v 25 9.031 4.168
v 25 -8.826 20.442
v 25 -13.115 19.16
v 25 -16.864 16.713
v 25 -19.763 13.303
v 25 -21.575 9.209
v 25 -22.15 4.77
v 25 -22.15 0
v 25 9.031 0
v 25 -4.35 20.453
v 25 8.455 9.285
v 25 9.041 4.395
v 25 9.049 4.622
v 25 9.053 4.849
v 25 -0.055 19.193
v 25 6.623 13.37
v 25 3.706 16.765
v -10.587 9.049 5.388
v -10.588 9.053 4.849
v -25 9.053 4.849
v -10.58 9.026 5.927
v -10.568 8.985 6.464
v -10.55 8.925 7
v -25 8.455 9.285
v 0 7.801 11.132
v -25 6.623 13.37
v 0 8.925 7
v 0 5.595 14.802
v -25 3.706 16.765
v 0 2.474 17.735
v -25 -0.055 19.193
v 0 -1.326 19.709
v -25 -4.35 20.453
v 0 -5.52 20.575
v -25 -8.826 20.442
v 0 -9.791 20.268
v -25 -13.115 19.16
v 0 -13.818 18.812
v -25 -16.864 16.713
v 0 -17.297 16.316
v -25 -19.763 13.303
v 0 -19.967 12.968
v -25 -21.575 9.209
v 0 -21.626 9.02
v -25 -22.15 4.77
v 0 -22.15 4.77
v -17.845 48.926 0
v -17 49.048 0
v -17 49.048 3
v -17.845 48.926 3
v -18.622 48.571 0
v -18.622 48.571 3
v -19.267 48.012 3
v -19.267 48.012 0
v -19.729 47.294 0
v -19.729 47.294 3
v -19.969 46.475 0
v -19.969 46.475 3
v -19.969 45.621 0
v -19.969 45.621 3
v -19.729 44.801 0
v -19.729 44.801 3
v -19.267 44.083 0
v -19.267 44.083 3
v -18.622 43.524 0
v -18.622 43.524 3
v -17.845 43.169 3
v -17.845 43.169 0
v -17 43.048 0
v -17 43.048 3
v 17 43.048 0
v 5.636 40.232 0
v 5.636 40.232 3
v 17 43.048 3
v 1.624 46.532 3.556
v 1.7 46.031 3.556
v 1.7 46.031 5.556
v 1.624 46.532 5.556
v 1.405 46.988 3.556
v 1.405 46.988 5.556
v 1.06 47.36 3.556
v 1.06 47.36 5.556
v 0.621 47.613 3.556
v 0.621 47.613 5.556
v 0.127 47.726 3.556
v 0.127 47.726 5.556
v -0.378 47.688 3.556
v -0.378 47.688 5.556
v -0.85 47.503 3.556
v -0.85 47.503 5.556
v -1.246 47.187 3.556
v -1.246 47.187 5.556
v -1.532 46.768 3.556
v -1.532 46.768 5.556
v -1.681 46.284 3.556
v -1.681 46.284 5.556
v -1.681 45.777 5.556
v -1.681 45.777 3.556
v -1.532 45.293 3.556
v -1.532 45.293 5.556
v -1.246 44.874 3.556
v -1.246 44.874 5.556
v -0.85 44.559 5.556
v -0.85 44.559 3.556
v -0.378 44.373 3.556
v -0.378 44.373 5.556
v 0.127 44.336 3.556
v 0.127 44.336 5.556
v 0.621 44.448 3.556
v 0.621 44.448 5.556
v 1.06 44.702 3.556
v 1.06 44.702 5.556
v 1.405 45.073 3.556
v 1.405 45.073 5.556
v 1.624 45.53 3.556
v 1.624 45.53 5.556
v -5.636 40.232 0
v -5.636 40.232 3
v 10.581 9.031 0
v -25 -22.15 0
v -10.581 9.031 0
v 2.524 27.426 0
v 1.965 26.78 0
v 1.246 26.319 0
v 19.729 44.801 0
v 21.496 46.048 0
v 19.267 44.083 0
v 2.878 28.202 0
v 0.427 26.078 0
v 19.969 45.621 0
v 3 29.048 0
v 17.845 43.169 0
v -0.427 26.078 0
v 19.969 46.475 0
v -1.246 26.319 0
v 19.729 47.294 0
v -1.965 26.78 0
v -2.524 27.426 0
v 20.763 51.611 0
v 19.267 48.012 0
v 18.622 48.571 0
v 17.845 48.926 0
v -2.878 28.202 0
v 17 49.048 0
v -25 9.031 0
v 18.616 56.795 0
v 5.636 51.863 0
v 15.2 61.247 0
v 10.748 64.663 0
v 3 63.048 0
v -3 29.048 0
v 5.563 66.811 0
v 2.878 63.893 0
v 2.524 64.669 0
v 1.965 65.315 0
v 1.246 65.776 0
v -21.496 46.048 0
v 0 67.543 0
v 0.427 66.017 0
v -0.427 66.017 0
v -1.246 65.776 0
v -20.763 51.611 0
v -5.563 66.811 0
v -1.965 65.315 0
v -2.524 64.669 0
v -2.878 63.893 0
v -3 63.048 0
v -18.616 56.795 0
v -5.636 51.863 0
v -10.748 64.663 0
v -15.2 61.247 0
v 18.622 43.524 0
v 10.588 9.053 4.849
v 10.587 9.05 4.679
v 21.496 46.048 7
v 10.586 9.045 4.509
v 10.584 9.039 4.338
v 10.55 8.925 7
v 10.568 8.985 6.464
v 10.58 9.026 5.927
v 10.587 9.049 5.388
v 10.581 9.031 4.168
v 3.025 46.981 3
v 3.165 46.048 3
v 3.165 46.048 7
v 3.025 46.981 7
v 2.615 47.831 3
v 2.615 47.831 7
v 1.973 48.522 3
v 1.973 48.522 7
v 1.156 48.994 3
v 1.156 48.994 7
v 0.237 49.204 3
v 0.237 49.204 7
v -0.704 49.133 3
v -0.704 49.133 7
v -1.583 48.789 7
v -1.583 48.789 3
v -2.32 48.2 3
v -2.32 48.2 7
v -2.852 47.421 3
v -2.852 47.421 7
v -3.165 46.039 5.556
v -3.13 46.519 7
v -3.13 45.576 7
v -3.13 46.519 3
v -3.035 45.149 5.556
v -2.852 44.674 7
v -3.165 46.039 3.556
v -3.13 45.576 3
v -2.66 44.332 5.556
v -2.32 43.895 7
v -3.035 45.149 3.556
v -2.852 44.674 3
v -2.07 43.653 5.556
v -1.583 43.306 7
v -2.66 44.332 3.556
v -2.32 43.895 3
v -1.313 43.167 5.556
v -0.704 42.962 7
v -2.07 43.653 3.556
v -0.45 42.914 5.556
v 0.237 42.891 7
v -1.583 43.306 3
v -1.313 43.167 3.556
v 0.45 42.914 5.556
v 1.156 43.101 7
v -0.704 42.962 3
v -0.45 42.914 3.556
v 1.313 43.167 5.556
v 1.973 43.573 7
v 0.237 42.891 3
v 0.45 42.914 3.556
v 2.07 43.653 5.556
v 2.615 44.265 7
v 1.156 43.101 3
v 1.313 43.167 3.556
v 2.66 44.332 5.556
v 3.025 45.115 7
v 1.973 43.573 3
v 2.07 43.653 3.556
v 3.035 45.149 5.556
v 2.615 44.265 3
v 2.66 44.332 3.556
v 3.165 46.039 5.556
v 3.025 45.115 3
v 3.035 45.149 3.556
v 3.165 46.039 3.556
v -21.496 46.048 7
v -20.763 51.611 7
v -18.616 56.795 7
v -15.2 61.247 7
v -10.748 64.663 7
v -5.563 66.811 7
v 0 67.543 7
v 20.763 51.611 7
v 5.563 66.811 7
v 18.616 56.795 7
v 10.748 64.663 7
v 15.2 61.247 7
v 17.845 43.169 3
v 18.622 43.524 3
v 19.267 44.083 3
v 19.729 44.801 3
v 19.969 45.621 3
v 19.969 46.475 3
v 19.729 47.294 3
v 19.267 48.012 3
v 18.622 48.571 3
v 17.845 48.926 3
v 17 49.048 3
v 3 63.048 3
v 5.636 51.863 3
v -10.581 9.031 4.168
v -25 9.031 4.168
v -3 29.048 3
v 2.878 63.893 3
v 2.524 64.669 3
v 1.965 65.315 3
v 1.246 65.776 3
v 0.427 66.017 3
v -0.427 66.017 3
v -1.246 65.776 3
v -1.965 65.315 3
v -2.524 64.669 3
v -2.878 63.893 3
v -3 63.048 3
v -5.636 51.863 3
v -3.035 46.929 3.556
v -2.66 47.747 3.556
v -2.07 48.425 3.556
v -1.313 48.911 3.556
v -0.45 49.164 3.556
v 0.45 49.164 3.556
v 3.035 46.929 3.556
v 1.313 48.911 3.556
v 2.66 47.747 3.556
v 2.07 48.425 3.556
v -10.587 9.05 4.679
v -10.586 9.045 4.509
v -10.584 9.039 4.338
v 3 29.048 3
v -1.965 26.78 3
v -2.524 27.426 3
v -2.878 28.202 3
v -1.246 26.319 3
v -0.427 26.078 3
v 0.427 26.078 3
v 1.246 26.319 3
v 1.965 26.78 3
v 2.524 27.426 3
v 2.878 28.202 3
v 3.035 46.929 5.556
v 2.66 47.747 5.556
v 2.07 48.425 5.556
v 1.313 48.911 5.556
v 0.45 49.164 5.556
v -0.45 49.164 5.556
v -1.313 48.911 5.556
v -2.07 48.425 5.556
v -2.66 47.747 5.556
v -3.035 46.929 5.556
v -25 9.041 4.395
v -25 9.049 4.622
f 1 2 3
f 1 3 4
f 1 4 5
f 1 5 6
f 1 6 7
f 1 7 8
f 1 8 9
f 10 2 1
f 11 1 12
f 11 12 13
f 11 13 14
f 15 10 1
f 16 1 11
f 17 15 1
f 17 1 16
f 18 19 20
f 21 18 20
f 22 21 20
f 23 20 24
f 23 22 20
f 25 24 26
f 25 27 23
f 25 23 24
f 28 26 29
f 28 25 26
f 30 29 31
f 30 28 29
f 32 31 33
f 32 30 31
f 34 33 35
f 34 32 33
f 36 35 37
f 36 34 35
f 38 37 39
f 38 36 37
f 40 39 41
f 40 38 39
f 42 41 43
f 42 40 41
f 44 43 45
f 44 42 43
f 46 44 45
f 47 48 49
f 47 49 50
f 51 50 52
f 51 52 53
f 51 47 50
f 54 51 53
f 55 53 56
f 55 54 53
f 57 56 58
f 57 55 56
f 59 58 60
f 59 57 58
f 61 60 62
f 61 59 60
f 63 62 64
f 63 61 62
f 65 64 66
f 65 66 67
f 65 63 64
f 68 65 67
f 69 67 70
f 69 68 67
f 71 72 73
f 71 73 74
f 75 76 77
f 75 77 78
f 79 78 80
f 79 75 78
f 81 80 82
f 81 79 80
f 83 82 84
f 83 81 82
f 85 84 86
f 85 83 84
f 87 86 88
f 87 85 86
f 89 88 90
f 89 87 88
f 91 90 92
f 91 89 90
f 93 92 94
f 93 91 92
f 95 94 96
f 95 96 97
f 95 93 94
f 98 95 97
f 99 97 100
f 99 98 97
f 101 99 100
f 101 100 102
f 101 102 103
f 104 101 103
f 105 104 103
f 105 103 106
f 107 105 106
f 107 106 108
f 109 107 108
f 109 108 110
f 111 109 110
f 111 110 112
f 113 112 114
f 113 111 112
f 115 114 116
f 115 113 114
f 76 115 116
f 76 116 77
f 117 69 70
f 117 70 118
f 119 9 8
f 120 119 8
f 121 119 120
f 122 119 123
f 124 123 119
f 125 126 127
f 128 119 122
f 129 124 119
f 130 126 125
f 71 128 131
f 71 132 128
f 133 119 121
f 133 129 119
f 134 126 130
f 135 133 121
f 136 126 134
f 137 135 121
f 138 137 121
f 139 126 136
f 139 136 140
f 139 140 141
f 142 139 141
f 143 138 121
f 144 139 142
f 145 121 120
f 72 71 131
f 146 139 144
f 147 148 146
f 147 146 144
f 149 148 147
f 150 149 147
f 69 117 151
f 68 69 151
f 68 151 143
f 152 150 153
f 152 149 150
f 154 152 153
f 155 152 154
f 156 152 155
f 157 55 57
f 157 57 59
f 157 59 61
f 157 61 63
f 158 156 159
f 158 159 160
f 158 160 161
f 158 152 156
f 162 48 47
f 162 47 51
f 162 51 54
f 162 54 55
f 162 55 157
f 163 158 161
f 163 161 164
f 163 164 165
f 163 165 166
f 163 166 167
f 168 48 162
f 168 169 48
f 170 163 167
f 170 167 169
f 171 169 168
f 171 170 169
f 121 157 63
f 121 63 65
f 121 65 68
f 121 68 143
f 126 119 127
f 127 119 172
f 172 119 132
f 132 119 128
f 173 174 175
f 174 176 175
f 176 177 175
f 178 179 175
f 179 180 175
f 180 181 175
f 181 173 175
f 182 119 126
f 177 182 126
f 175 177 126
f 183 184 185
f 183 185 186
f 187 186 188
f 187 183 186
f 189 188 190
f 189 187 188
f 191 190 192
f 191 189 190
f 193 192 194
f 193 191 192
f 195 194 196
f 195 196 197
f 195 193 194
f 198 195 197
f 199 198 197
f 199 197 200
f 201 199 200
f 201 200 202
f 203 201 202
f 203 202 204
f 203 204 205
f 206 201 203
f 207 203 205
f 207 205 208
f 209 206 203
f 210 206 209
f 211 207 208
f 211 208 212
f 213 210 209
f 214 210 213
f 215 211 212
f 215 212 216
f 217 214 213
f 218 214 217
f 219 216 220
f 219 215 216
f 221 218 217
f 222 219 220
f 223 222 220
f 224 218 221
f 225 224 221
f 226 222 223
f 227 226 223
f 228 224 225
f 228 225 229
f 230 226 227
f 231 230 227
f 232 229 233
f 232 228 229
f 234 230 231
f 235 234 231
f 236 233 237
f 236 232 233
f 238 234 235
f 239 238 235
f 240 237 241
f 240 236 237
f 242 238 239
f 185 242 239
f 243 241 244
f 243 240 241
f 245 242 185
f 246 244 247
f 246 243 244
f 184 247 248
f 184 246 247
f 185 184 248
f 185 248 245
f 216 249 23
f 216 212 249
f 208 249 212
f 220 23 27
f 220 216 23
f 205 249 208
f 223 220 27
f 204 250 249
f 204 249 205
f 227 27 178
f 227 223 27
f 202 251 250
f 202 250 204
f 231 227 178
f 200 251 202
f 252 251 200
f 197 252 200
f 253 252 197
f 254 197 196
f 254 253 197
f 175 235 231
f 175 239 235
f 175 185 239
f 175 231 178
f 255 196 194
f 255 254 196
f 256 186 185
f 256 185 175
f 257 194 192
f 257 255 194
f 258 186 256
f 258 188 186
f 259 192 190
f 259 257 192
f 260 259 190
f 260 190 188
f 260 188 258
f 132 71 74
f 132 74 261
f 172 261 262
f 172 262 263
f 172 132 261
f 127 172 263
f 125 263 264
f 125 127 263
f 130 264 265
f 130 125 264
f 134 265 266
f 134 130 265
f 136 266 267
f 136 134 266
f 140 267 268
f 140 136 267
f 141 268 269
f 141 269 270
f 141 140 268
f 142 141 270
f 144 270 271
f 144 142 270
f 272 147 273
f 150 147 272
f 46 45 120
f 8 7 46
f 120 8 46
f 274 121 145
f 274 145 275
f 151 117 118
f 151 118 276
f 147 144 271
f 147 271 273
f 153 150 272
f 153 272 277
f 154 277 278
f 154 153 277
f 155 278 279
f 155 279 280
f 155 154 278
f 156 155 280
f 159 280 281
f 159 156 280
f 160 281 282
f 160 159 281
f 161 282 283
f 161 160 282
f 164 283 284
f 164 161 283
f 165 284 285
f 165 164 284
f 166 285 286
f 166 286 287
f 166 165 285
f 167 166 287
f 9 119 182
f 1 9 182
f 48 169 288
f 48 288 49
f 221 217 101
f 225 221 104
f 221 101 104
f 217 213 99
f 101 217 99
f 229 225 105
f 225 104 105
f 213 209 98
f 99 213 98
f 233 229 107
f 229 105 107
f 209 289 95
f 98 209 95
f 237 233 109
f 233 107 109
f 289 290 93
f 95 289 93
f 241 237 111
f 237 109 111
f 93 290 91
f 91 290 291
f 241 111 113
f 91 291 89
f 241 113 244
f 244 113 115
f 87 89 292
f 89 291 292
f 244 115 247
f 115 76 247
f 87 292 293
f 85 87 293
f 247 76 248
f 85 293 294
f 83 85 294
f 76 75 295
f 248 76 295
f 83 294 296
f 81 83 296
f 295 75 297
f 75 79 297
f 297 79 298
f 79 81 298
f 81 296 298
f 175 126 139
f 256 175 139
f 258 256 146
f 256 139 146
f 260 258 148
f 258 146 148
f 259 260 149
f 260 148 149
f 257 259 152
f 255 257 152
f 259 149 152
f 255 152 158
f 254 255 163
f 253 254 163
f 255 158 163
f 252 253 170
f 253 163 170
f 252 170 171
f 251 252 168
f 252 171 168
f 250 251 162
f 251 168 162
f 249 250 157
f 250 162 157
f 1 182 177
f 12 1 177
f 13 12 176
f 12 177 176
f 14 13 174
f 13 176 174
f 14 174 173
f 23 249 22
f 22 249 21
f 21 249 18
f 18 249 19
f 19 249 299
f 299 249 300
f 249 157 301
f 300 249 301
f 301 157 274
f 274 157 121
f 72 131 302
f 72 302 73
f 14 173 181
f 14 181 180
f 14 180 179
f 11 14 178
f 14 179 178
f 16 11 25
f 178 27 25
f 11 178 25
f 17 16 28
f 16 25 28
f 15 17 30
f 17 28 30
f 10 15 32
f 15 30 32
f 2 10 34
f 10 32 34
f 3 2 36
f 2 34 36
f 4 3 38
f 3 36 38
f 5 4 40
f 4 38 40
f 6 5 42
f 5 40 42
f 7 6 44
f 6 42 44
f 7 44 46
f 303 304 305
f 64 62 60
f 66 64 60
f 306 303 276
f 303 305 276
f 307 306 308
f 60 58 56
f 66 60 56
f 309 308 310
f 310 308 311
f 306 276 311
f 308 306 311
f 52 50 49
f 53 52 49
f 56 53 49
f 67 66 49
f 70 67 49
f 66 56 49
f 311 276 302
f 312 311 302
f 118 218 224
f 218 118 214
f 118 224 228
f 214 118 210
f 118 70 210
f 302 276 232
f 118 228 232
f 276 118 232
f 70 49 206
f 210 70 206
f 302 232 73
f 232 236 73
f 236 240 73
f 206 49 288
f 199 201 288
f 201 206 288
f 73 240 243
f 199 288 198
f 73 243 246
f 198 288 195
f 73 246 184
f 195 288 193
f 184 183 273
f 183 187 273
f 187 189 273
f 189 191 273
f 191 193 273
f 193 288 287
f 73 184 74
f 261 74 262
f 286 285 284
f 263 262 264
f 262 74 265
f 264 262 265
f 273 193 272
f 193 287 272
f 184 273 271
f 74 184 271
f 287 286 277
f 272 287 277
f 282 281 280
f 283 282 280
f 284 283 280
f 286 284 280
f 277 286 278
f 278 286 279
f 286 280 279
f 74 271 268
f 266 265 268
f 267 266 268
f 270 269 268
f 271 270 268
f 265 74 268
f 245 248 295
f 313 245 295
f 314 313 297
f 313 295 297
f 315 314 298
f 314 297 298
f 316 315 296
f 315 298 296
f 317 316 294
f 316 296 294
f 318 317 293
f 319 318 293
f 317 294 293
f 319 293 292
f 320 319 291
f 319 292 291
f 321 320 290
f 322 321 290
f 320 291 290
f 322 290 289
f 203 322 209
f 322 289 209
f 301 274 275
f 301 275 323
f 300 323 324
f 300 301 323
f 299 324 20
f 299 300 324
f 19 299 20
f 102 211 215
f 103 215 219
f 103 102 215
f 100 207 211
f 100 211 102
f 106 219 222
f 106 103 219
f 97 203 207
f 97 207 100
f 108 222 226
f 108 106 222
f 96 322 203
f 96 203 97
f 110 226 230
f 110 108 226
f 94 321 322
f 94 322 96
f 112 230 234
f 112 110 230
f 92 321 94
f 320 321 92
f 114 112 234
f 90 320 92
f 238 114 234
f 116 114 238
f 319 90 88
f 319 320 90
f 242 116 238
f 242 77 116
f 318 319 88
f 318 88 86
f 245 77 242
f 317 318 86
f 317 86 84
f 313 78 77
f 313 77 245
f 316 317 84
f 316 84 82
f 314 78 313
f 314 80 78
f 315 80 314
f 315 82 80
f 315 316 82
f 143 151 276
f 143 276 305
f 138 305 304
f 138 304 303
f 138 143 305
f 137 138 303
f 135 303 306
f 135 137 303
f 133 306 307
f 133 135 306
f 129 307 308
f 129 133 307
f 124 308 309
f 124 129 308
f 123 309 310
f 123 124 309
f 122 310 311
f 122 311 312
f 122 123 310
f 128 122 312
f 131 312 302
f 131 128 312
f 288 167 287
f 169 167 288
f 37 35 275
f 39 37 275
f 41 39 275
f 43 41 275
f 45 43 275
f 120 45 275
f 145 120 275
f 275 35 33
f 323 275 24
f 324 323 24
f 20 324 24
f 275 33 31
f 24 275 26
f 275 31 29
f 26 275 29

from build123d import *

# Parameters (mm, degrees)
F0_R     = 3.1652149855
F1_DEPTH = 7
F3_DEPTH = 25
F5_DEPTH = 3
F7_R     = 3.1652149855
F7_R_2   = 1.7
F8_DEPTH = 2


with BuildPart() as f1:
    # F0 (on Top) → F1 (new body)
    with BuildSketch(Plane.XY):
        with BuildLine():
            Line((7.6635631778, -0.8648966905), (21.4957091957, 46.0475608706))
            ThreePointArc((21.4957091957, 46.0475608706), (0, 67.5432700664), (-21.4957091957, 46.0475608706))
            Line((-21.4957091957, 46.0475608706), (-7.6635631778, -0.8648966905))
            Line((-7.6635631778, -0.8648966905), (7.6635631778, -0.8648966905))
        make_face()
        with BuildLine():
            ThreePointArc((17, 49.0475608706), (20, 46.0475608706), (17, 43.0475608706))
            Line((17, 43.0475608706), (5.6355242597, 40.232100229))
            Line((5.6355242597, 40.232100229), (3, 29.0475608706))
            ThreePointArc((3, 29.0475608706), (0, 26.0475608706), (-3, 29.0475608706))
            Line((-3, 29.0475608706), (-5.6355242597, 40.232100229))
            Line((-5.6355242597, 40.232100229), (-17, 43.0475608706))
            ThreePointArc((-17, 43.0475608706), (-20, 46.0475608706), (-17, 49.0475608706))
            Line((-17, 49.0475608706), (-5.6355242597, 51.8630215122))
            Line((-5.6355242597, 51.8630215122), (-3, 63.0475608706))
            ThreePointArc((-3, 63.0475608706), (0, 66.0475608706), (3, 63.0475608706))
            Line((3, 63.0475608706), (5.6355242597, 51.8630215122))
            Line((5.6355242597, 51.8630215122), (17, 49.0475608706))
        make_face(mode=Mode.SUBTRACT)
        with BuildLine():
            Line((5.6355242597, 40.232100229), (17, 43.0475608706))
            ThreePointArc((17, 43.0475608706), (20, 46.0475608706), (17, 49.0475608706))
            Line((17, 49.0475608706), (5.6355242597, 51.8630215122))
            Line((5.6355242597, 51.8630215122), (3, 63.0475608706))
            ThreePointArc((3, 63.0475608706), (0, 66.0475608706), (-3, 63.0475608706))
            Line((-3, 63.0475608706), (-5.6355242597, 51.8630215122))
            Line((-5.6355242597, 51.8630215122), (-17, 49.0475608706))
            ThreePointArc((-17, 49.0475608706), (-20, 46.0475608706), (-17, 43.0475608706))
            Line((-17, 43.0475608706), (-5.6355242597, 40.232100229))
            Line((-5.6355242597, 40.232100229), (-3, 29.0475608706))
            ThreePointArc((-3, 29.0475608706), (0, 26.0475608706), (3, 29.0475608706))
            Line((3, 29.0475608706), (5.6355242597, 40.232100229))
        make_face()
        with Locations((0, 46.0475608706)):
            Circle(F0_R, mode=Mode.SUBTRACT)
    extrude(amount=F1_DEPTH)

    # F2 (on Right) → F3 (join)
    with BuildSketch(Plane.YZ):
        with BuildLine():
            Line((-22.1495963633, 4.7701704316), (9.0307667851, 4.7701704316))
            ThreePointArc((9.0307667851, 4.7701704316), (9.0416852427, 4.809647179), (9.0525037393, 4.8491514374))
            ThreePointArc((9.0525037393, 4.8491514374), (-6.5885383667, 20.6088531813), (-22.1495963633, 4.7701704316))
        make_face()
        Polygon((9.0307667851, 4.168368876), (9.0307667851, 4.7701704316), (-22.1495963633, 4.7701704316), (-22.1495963633, 0), (9.0307667851, 0), align=None)
        with BuildLine():
            ThreePointArc((9.0525037393, 4.8491514374), (9.0416852427, 4.809647179), (9.0307667851, 4.7701704316))
            Line((9.0307667851, 4.7701704316), (9.0307667851, 4.168368876))
            ThreePointArc((9.0307667851, 4.168368876), (9.0453507005, 4.5086415251), (9.0525037393, 4.8491514374))
        make_face()
    extrude(amount=F3_DEPTH)

    # F4: F1 across plane


with BuildPart() as f1_1:
    add(f1.part)
    add(f1.part.mirror(Plane.YZ))

    # F0 (on Top) → F5 (cut)
    with BuildSketch(Plane.XY):
        with BuildLine():
            Line((5.6355242597, 40.232100229), (17, 43.0475608706))
            ThreePointArc((17, 43.0475608706), (20, 46.0475608706), (17, 49.0475608706))
            Line((17, 49.0475608706), (5.6355242597, 51.8630215122))
            Line((5.6355242597, 51.8630215122), (3, 63.0475608706))
            ThreePointArc((3, 63.0475608706), (0, 66.0475608706), (-3, 63.0475608706))
            Line((-3, 63.0475608706), (-5.6355242597, 51.8630215122))
            Line((-5.6355242597, 51.8630215122), (-17, 49.0475608706))
            ThreePointArc((-17, 49.0475608706), (-20, 46.0475608706), (-17, 43.0475608706))
            Line((-17, 43.0475608706), (-5.6355242597, 40.232100229))
            Line((-5.6355242597, 40.232100229), (-3, 29.0475608706))
            ThreePointArc((-3, 29.0475608706), (0, 26.0475608706), (3, 29.0475608706))
            Line((3, 29.0475608706), (5.6355242597, 40.232100229))
        make_face()
        with Locations((0, 46.0475608706)):
            Circle(F0_R, mode=Mode.SUBTRACT)
    extrude(amount=F5_DEPTH, mode=Mode.SUBTRACT)

    # F7 (on offset) → F8 (join)
    with BuildSketch(Plane.XY.offset(3.556)):
        with Locations((0, 46.0307821631)):
            Circle(F7_R)
        with Locations((0, 46.0307821631)):
            Circle(F7_R_2, mode=Mode.SUBTRACT)
    extrude(amount=F8_DEPTH)


solid = f1_1.part
